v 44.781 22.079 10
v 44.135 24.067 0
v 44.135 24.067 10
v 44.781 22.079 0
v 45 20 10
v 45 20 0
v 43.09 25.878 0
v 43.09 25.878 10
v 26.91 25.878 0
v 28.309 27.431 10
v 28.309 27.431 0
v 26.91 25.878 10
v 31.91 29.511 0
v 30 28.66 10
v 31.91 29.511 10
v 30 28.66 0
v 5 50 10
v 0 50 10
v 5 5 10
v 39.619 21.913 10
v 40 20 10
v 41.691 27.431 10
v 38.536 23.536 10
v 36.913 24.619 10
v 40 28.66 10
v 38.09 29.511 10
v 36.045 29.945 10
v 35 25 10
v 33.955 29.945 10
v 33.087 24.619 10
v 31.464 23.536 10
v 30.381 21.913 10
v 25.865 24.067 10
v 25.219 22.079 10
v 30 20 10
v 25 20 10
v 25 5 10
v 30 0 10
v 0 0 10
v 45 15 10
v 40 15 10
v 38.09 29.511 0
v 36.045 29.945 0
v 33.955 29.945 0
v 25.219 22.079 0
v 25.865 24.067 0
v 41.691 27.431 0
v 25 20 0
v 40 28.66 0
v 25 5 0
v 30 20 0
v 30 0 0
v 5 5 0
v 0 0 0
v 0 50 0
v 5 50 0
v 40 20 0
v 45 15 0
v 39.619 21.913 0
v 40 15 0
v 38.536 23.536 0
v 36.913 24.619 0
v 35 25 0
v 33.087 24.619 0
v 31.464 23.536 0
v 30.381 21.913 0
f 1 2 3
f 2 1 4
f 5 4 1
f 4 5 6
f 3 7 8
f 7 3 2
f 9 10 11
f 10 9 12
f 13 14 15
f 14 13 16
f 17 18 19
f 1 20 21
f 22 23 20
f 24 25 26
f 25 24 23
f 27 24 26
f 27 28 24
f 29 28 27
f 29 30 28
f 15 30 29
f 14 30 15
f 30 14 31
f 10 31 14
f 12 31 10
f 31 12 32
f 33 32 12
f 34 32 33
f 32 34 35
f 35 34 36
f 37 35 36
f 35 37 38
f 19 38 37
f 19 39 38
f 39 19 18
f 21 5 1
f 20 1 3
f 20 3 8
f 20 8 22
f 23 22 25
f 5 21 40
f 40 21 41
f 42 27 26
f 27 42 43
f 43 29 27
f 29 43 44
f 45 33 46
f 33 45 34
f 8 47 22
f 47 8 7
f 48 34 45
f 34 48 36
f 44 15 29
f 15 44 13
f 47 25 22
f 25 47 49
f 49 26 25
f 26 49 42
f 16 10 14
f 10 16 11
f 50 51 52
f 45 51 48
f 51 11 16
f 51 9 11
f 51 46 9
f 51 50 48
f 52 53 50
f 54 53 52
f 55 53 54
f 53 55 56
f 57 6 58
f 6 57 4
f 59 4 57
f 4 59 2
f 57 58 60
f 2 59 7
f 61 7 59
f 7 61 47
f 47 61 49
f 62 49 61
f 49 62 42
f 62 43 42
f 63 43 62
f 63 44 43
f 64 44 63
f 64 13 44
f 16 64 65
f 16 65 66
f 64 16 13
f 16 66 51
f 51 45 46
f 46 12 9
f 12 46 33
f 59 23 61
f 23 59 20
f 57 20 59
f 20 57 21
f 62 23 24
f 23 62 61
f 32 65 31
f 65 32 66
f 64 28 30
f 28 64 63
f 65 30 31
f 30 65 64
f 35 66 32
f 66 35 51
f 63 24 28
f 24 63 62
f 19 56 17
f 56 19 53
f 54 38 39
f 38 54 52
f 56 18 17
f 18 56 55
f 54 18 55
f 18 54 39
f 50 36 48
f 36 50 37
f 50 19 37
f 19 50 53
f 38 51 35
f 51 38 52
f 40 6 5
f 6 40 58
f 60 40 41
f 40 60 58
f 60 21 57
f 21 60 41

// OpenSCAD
// the thickness of the lines as as seen from above
thickness = 5;

// how high it will protrude from the build plate
width = 10;

// the length of the part that goes behind the wall
length = 50;

// the wall thickness. It doesn't have to be a cubicle ;)
cubicle = 20;

// how far it goes down before the roundness starts
hang = 20;

// the inner width of the half-circle part of the hook
gap = 10;

// vertical part above the hook to prevent slipping off
tip = 5;

module hook() {
  union() {
    // make the part behind the wall
    cube([thickness, width, length]);

    // the part above the wall
    translate([thickness, 0, length-thickness])
    cube([cubicle, width, thickness]);

    // the part that goes down to the hook
    translate([cubicle+thickness, 0, length-hang])
    cube([thickness, width, hang]);

    // the round part of the hook
    difference() {
      // a big cylinder
      translate([thickness*2+cubicle+gap/2, 0, length-hang])
      rotate([270, 0, 0])
      cylinder(h=width, d=gap+2*thickness);

      // minus a smaller cylinder
      translate([cubicle+thickness*2+gap/2, -0.1, length-hang])
      rotate([270, 0, 0])
      cylinder(h=width+0.2, d=gap);

      // minus a cube to turn it into a semicircle
      translate([cubicle+thickness, -0.1, length-hang])
      cube([gap+2*thickness, width+0.2, gap+2*thickness]);
    }

    // add a vertical tip above the hook
    translate([cubicle+thickness*2+gap, 0, length-hang])
    cube([thickness, width, tip]);
  }
}

// TIP: don't translate/rotate and then you can see it in the orientation it
// will be used.
translate([0, length, 0])
rotate([90, 0, 0])
hook();
